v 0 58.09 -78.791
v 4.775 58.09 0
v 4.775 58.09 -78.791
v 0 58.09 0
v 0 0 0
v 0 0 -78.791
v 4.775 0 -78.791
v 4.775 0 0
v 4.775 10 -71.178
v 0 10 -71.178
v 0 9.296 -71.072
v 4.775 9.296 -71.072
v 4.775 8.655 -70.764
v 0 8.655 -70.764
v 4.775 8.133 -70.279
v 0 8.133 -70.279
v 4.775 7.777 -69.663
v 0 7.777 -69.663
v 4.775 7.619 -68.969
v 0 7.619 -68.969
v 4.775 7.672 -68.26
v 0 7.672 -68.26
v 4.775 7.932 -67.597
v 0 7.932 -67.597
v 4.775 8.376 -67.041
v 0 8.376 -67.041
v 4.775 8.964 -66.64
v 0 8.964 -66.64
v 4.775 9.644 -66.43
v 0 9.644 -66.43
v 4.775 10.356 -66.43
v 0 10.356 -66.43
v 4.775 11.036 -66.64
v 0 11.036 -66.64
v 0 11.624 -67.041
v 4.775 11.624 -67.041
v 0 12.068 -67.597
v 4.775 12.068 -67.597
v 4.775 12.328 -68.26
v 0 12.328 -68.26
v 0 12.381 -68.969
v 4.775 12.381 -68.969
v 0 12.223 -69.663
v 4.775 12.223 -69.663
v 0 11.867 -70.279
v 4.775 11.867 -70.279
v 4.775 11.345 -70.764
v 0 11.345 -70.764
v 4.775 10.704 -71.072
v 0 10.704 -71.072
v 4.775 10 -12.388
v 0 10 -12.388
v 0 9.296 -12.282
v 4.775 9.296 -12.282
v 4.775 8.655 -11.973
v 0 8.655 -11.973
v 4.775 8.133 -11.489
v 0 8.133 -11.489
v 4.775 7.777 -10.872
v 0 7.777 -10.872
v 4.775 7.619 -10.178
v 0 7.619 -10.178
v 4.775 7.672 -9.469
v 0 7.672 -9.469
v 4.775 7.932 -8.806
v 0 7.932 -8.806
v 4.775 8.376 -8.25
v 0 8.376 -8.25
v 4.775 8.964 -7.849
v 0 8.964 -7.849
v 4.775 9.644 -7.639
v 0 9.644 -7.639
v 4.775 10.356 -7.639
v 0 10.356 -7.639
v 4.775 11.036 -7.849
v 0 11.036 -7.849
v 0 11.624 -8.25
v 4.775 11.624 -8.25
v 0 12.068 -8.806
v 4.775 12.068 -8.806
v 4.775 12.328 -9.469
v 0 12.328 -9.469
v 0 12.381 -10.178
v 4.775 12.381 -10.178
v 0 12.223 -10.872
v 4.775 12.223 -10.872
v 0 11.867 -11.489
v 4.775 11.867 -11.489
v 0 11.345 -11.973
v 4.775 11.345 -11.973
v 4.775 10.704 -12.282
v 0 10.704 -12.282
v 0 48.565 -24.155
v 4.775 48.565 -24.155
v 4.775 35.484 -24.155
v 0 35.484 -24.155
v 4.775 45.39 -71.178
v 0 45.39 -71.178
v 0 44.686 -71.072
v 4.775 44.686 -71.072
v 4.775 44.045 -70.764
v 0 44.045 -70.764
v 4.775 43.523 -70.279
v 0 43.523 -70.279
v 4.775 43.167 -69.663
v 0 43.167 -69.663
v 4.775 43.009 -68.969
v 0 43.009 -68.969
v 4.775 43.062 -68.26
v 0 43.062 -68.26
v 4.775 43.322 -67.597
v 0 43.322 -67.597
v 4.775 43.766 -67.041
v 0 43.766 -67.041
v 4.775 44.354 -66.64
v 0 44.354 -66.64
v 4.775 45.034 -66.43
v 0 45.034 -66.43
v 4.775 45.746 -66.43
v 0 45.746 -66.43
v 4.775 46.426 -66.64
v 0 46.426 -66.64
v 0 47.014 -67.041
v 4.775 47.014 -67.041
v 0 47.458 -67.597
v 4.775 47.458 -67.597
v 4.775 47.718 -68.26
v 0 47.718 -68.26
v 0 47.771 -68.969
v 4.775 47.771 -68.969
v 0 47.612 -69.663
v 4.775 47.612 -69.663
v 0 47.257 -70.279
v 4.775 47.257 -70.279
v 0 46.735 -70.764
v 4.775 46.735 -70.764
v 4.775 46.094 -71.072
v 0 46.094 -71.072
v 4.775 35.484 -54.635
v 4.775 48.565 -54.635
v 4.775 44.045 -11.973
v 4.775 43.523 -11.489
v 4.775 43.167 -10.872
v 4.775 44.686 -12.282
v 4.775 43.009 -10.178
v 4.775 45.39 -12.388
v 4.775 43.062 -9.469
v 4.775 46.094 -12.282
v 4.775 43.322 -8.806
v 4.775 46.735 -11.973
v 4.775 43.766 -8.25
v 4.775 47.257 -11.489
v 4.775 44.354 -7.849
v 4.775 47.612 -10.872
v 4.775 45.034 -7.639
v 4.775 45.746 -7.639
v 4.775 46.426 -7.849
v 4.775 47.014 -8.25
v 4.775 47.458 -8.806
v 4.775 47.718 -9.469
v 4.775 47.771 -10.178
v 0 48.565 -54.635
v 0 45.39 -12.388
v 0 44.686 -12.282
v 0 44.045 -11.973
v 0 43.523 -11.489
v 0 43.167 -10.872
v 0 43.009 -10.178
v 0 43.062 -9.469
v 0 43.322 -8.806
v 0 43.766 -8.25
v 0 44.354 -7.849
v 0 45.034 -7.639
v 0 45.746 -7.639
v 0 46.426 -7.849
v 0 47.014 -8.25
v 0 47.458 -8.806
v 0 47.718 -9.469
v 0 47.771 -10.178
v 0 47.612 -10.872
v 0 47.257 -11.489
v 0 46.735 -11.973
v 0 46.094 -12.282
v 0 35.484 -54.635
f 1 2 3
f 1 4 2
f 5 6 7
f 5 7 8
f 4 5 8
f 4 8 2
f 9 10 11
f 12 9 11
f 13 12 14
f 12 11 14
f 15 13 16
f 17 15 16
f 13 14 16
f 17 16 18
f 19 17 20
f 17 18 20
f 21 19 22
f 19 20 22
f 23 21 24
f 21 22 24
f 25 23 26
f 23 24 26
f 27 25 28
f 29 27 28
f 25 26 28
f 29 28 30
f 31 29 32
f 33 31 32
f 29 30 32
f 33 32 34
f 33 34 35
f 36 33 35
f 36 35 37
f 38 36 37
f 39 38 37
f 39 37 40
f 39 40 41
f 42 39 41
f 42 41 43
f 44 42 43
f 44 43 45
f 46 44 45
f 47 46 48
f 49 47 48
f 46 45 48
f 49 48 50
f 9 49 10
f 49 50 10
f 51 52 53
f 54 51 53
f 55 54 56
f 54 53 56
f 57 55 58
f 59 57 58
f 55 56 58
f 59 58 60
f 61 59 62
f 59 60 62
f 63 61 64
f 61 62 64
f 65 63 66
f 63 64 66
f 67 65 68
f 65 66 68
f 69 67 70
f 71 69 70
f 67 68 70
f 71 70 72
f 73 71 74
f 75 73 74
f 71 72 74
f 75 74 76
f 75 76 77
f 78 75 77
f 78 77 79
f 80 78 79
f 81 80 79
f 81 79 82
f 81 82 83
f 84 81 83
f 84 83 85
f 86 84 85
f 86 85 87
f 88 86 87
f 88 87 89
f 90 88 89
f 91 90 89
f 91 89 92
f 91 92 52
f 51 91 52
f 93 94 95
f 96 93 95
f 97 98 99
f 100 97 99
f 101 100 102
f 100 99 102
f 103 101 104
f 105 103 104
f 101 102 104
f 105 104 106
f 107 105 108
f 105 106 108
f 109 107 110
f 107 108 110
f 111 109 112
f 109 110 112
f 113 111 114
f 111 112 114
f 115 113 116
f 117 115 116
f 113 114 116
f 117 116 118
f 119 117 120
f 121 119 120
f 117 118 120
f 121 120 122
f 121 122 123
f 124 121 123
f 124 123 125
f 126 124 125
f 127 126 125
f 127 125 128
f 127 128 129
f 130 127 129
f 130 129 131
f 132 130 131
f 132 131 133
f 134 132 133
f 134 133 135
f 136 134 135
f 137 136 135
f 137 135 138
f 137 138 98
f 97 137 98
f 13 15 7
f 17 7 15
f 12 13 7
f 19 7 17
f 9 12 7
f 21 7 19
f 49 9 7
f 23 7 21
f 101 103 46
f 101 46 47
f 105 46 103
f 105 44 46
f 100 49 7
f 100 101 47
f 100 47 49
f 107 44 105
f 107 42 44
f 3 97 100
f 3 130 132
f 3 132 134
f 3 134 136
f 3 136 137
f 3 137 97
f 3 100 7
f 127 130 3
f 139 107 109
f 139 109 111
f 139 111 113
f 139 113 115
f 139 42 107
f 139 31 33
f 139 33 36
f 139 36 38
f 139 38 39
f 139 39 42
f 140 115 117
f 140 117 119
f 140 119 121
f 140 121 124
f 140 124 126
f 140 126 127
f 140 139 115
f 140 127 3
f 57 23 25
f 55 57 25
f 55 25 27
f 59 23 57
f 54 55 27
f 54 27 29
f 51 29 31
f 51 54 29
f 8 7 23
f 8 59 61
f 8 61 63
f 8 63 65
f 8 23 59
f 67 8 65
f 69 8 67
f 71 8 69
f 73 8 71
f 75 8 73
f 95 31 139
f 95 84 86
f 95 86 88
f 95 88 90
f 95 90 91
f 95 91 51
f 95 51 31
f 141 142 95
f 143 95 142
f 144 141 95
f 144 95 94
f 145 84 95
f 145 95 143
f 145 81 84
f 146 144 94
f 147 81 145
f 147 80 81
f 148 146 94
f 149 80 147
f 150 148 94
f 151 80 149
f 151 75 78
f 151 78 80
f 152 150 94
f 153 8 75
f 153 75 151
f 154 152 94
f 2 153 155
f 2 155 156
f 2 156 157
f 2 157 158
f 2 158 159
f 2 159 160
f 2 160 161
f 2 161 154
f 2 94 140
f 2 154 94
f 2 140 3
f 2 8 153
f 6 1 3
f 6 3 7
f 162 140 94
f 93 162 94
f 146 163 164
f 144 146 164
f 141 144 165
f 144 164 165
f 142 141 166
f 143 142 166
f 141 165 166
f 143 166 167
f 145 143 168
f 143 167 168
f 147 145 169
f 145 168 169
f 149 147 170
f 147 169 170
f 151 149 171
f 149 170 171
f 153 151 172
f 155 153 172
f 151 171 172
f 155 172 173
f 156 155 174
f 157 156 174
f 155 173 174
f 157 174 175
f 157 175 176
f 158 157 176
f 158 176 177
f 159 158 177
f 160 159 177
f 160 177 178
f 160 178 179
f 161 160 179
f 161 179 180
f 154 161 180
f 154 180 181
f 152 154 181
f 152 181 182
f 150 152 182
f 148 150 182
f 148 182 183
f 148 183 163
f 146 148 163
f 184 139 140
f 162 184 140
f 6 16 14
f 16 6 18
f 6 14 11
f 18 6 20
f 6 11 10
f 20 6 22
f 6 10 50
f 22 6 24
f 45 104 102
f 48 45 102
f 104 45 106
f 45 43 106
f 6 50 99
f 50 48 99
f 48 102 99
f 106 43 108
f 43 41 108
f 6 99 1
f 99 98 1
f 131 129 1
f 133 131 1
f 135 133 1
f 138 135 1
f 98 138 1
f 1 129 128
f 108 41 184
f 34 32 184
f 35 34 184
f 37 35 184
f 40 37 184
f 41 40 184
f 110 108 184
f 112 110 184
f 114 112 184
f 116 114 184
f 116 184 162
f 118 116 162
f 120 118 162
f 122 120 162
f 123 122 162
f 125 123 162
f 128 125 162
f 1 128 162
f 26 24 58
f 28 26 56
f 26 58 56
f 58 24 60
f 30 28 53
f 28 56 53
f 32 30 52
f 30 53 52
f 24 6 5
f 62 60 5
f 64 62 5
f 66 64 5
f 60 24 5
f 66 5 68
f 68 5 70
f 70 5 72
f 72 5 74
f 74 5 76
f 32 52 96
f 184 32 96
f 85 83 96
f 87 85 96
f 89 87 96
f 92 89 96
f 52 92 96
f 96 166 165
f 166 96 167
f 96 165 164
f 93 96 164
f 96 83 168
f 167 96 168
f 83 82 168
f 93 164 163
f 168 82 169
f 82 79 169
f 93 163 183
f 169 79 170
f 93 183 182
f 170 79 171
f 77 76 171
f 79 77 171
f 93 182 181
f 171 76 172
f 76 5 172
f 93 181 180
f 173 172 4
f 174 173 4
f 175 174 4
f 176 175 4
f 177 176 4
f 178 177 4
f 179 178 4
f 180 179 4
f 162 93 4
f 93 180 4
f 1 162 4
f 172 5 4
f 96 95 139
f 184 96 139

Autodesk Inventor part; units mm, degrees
ref_plane "YZ Plane" through (0, 0, 0) normal (1, 0, 0) x (0, 1, 0)
ref_plane "XZ Plane" through (0, 0, 0) normal (0, 1, 0) x (-1, 0, 0)
ref_plane "XY Plane" through (0, 0, 0) normal (0, 0, 1) x (1, 0, 0)
sketch "Sketch1" plane through (0, 0, 0) normal (1, 0, 0) x (0, 1, 0)
  line L0 (0, 0) -> (58.0898, 0)
  line L1 (58.0898, 0) -> (58.0898, -78.7908)
  line L2 (58.0898, -78.7908) -> (0, -78.7908)
  line L3 (0, -78.7908) -> (0, 0)
  dimension "d0" = 78.7908
  dimension "d1" = 58.0898
extrude "Extrusion1" add sketch "Sketch1" along normal blind 4.7752
sketch "Sketch2" plane through (4.7752, 0, 0) normal (1, 0, 0) x (0, 0, -1)
  line L0 (0, 58.0898) -> (0, 0) projected
  line L1 (78.7908, 58.0898) -> (0, 58.0898) projected
  line L2 (0, 0) -> (78.7908, 0) projected
  line L3 (78.7908, 0) -> (78.7908, 58.0898) projected
  point P0 (10, 45.3898)
  point P1 (68.7908, 45.3898)
  point P2 (10, 10)
  point P3 (68.7908, 10)
  dimension "d4" = 10
  dimension "d6" = 10
  dimension "d7" = 10
  dimension "d9" = 10
  dimension "d10" = 12.7
  dimension "d12" = 12.7
  dimension "d16" = 10
  dimension "d17" = 10
hole "Hole1" at (4.7752, 45.3898, -10) at (4.7752, 45.3898, -68.7908) at (4.7752, 10, -10) at (4.7752, 10, -68.7908) direction (-1, 0, 0) diameter 4.7752 end through all
sketch "Sketch3" plane through (4.7752, 0, 0) normal (1, 0, 0) x (0, 0, -1)
  line L0 (24.1554, 35.4838) -> (54.6354, 35.4838)
  line L1 (54.6354, 35.4838) -> (54.6354, 48.5648)
  line L2 (54.6354, 48.5648) -> (24.1554, 48.5648)
  line L3 (24.1554, 48.5648) -> (24.1554, 35.4838)
  line L4 (0, 58.0898) -> (0, 0) projected
  line L5 (78.7908, 58.0898) -> (0, 58.0898) projected
  dimension "d25" = 13.081
  dimension "d26" = 30.48
  dimension "d28" = 78.7908
  dimension "d29" = 24.1554
  dimension "d30" = 58.0898
  dimension "d31" = 9.525
extrude "Extrusion2" cut sketch "Sketch3" against normal through all
equation "\"d29\" = -0.5 * d26 + 0.5 * d28"
properties part number "SwitchBracket"
